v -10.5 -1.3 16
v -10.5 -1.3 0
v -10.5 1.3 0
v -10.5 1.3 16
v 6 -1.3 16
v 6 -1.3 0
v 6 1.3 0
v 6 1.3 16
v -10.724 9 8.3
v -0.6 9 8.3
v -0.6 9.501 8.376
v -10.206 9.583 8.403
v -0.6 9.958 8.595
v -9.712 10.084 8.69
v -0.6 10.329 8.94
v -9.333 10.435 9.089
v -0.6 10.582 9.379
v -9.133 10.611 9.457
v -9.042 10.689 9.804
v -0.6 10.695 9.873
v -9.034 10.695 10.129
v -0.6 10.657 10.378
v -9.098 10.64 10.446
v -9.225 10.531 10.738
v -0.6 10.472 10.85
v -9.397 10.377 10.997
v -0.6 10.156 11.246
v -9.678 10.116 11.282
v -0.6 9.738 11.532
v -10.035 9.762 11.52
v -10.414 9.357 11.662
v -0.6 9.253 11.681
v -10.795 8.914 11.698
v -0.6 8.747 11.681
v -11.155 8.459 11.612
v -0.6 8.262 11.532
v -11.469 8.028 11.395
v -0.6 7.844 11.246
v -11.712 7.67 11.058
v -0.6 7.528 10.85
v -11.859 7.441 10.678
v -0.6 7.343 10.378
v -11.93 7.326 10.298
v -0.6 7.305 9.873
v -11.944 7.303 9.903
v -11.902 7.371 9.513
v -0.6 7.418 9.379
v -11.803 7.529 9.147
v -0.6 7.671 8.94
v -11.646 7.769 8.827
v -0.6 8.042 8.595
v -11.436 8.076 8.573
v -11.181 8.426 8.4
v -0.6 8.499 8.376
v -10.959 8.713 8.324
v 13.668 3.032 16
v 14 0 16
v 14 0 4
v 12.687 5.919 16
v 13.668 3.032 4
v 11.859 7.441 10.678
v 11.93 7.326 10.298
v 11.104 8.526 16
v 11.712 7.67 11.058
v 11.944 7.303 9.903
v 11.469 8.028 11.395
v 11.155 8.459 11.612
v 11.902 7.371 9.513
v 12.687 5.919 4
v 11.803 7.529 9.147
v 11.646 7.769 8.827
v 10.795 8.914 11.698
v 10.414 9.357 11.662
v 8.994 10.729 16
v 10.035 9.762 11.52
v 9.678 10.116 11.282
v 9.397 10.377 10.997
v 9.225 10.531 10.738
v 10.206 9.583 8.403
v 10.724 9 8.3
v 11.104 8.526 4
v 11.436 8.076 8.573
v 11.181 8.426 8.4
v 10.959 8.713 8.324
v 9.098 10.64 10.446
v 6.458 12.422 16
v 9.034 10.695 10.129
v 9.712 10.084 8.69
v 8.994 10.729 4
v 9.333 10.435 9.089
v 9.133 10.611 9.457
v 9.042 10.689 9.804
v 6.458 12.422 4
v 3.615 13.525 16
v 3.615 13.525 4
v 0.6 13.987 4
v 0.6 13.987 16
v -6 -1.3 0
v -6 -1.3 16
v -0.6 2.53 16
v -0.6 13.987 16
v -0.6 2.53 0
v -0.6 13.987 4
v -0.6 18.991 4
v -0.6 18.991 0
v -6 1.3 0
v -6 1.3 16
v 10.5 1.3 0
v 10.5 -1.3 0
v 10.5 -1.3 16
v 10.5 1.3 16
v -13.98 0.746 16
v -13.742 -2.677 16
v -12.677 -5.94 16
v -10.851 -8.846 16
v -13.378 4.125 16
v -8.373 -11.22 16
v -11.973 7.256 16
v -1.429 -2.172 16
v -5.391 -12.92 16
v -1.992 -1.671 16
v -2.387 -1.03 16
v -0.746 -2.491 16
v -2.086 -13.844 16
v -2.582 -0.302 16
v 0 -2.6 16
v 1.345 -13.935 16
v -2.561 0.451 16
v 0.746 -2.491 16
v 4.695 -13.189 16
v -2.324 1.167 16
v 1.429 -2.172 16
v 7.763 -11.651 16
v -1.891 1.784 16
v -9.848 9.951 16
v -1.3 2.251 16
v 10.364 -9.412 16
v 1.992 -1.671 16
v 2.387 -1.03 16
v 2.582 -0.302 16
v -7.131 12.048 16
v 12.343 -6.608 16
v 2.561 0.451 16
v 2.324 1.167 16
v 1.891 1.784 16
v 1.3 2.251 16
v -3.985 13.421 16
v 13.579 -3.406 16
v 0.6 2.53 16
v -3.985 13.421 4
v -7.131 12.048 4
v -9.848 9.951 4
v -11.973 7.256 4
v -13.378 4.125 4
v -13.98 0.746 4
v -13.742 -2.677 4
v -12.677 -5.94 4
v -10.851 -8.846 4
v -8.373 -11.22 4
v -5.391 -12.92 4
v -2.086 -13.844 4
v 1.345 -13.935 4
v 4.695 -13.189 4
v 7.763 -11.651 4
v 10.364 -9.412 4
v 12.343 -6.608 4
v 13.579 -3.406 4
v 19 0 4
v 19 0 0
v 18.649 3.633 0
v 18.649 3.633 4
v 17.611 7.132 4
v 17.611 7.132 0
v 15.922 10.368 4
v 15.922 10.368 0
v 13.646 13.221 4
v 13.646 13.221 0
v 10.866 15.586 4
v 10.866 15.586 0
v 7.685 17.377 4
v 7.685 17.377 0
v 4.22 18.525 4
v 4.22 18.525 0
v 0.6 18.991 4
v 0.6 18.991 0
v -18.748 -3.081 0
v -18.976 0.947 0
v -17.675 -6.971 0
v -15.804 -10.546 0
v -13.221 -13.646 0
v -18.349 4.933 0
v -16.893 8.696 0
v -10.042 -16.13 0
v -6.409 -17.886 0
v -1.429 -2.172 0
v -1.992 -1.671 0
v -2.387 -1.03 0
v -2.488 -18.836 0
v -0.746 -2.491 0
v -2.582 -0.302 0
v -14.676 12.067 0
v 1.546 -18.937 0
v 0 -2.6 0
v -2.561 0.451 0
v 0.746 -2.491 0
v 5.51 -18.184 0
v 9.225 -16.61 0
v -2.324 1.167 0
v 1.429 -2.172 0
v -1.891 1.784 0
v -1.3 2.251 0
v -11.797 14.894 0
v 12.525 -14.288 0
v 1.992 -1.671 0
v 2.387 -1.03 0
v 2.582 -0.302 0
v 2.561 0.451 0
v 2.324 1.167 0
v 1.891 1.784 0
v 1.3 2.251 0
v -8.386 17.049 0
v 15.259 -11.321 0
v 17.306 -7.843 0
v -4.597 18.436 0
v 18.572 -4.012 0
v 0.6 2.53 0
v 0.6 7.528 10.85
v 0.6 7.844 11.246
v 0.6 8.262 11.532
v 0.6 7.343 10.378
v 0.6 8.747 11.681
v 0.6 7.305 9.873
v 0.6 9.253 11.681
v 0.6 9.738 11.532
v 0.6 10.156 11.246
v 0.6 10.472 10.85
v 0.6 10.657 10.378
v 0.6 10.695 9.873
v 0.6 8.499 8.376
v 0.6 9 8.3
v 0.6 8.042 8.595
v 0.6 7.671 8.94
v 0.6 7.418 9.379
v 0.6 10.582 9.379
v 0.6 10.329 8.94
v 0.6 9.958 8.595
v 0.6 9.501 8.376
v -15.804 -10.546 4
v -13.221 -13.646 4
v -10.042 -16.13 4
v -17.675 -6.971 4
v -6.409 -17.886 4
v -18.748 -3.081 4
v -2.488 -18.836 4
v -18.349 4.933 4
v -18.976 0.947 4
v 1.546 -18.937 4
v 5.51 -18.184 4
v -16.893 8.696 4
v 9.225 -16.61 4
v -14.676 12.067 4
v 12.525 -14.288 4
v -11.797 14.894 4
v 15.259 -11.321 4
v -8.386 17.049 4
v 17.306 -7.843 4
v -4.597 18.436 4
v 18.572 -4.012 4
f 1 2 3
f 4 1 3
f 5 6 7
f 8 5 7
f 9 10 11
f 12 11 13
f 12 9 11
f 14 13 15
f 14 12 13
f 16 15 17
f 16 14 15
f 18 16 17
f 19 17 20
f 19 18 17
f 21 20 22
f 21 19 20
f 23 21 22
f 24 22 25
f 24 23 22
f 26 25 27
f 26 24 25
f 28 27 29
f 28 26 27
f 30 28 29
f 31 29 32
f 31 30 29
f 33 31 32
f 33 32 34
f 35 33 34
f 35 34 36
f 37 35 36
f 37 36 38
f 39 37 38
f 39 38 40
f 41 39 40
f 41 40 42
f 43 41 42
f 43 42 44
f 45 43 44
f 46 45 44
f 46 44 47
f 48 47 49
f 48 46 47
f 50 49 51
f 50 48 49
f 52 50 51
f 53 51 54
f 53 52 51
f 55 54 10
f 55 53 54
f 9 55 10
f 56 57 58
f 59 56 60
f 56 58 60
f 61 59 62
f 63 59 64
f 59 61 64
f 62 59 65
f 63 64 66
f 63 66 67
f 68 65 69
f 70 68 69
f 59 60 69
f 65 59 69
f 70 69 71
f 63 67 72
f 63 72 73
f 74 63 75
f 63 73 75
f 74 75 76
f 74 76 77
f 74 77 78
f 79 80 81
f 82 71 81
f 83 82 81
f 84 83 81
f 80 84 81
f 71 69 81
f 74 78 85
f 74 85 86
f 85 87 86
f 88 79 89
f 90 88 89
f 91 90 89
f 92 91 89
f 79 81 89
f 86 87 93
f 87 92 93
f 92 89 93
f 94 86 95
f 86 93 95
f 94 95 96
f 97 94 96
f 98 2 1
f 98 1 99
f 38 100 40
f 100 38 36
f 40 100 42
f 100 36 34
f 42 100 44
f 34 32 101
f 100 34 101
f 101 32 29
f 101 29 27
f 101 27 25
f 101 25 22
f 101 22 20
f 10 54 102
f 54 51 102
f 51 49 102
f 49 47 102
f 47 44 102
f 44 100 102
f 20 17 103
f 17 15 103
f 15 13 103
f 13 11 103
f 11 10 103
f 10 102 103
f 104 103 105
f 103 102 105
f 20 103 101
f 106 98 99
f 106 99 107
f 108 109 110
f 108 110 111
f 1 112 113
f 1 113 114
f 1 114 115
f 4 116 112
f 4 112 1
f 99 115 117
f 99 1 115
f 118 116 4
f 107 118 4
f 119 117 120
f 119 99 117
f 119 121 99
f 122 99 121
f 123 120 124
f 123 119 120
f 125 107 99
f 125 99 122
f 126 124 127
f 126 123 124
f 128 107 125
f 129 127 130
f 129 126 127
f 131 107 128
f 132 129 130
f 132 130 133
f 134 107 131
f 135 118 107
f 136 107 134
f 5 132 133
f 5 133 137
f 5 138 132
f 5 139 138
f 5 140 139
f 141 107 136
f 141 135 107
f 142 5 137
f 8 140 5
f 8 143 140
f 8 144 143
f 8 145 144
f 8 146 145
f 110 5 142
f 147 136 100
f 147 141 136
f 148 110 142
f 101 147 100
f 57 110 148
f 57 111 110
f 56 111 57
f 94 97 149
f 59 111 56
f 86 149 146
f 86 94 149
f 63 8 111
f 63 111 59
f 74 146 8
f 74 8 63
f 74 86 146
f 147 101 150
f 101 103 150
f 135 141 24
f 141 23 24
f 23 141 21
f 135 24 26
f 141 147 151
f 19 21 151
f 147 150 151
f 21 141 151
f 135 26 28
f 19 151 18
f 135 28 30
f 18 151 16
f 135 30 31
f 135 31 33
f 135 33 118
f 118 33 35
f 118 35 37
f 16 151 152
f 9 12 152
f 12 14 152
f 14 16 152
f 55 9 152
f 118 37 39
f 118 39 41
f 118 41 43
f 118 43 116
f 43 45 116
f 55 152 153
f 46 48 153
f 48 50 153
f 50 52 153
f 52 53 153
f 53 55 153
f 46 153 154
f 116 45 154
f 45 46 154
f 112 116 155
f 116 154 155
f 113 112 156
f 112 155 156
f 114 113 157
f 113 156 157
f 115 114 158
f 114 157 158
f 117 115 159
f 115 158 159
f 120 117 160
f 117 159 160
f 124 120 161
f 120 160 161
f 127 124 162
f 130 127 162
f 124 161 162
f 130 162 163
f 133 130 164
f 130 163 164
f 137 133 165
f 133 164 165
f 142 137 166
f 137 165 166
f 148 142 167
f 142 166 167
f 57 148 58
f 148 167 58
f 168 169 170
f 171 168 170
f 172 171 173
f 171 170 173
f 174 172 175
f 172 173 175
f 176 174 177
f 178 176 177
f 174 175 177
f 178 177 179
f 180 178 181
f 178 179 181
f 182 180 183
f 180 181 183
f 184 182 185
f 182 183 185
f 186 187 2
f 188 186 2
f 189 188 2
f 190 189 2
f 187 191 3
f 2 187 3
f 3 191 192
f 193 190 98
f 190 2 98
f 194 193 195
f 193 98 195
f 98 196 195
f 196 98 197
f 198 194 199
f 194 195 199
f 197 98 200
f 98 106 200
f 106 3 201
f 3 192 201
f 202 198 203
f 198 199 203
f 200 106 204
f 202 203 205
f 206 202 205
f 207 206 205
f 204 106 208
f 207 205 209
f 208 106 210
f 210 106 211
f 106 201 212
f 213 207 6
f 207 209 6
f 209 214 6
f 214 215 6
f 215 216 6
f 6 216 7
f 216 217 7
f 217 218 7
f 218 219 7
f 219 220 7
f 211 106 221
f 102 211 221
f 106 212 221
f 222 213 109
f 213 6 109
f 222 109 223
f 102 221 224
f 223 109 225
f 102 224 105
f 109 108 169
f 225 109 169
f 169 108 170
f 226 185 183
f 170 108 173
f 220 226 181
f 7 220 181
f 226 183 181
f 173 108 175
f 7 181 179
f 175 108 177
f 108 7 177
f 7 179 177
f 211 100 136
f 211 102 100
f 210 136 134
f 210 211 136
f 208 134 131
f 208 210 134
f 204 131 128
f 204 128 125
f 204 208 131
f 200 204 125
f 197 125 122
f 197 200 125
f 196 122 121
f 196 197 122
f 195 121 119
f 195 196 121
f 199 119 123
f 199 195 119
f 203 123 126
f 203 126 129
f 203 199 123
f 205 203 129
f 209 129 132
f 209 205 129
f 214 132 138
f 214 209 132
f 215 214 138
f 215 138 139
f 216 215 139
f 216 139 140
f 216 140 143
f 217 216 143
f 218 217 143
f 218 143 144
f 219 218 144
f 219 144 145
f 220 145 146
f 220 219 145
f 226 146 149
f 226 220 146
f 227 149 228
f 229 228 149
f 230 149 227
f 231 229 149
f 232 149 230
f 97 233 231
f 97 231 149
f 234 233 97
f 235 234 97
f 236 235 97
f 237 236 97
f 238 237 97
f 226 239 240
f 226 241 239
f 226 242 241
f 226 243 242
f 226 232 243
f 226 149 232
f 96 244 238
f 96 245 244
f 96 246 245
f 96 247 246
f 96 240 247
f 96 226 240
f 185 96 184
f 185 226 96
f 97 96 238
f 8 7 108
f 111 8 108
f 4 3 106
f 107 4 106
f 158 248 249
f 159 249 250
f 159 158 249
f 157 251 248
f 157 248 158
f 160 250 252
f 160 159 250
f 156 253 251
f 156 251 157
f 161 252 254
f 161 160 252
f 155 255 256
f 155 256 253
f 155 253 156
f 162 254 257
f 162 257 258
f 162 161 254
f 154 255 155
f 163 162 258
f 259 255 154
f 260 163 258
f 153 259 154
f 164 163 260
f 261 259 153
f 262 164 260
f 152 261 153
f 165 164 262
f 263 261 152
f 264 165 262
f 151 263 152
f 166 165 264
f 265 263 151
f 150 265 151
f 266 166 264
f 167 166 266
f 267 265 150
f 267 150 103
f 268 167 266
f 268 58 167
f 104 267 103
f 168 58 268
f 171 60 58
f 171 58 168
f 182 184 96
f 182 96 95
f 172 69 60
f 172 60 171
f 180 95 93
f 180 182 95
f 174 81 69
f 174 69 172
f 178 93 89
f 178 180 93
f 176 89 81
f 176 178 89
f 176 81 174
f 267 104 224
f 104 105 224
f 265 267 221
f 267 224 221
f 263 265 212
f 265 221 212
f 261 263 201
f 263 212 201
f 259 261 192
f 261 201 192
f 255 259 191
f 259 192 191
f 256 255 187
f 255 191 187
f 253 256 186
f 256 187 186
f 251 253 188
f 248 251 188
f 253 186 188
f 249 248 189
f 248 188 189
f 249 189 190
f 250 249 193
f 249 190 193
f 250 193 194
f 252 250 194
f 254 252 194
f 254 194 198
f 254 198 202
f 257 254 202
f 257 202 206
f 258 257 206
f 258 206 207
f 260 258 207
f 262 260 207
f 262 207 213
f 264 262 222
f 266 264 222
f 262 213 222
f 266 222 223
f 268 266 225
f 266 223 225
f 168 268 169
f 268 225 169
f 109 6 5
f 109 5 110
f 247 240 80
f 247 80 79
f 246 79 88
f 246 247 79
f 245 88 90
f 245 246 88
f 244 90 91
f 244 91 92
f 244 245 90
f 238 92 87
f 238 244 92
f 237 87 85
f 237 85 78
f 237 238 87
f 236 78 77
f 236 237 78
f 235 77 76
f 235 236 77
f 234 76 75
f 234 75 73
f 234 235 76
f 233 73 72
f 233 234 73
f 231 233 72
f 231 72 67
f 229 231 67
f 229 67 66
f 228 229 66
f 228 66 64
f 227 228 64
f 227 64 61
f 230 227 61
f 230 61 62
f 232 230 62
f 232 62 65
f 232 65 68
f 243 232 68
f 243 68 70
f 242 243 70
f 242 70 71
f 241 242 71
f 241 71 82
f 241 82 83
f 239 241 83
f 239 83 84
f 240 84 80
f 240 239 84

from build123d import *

# Parameters (mm, degrees)
SKETCH_1_R                                       = 19
HORN_FLANGE_D38_DEPTH                            = 4
SKETCH_2_R                                       = 14
SHAFT_CLAMP_HUB_DEPTH                            = 16
SHAFT_D5P2_DEPTH                                 = 32.272991542
SHAFT_D5P2_DEPTH_BACK                            = 32.272991542
SKETCH_3_R                                       = 2.6
CLAMP_SPLIT_DEPTH                                = 32.272991542
CLAMP_SPLIT_DEPTH_BACK                           = 32.272991542
SKETCH_4_W                                       = 1.2
SKETCH_4_H                                       = 17.8
HORN_TWO_ADJUSTMENT_SLOTS_VERIFY_HORN_DEPTH      = 32.272991542
HORN_TWO_ADJUSTMENT_SLOTS_VERIFY_HORN_DEPTH_BACK = 32.272991542
SKETCH_5_W                                       = 4.5
SKETCH_5_H                                       = 2.6
COUPLER_CLAMP_M3_DEPTH                           = 32.272991542
COUPLER_CLAMP_M3_DEPTH_BACK                      = 32.272991542
SKETCH_6_R                                       = 1.7


with BuildPart() as part:
    # 草图1 → Horn_flange_D38 (new body)
    with BuildSketch(Plane.XY):
        Circle(SKETCH_1_R)
    extrude(amount=HORN_FLANGE_D38_DEPTH)

    # 草图2 → Shaft_clamp_hub (add)
    with BuildSketch(Plane.XY):
        Circle(SKETCH_2_R)
    extrude(amount=SHAFT_CLAMP_HUB_DEPTH)

    # 草图3 → Shaft_D5p2 (cut, two sides: drawn at the far end of the back side and taken through both)
    with BuildSketch(Plane.XY.offset(-SHAFT_D5P2_DEPTH_BACK)):
        Circle(SKETCH_3_R)
    extrude(amount=SHAFT_D5P2_DEPTH + SHAFT_D5P2_DEPTH_BACK, mode=Mode.SUBTRACT)

    # 草图4 → Clamp_split (cut, two sides: drawn at the far end of the back side and taken through both)
    with BuildSketch(Plane.XY.offset(-CLAMP_SPLIT_DEPTH_BACK)):
        with Locations((0, 11.1)):
            Rectangle(SKETCH_4_W, SKETCH_4_H)
    extrude(amount=CLAMP_SPLIT_DEPTH + CLAMP_SPLIT_DEPTH_BACK, mode=Mode.SUBTRACT)

    # 草图5 → Horn_two_adjustment_slots_VERIFY_HORN (cut, two sides: drawn at the far end of the back side and taken through both)
    with BuildSketch(Plane.XY.offset(-HORN_TWO_ADJUSTMENT_SLOTS_VERIFY_HORN_DEPTH_BACK)):
        with Locations((-8.25, 0)):
            Rectangle(SKETCH_5_W, SKETCH_5_H)
        with Locations((8.25, 0)):
            Rectangle(SKETCH_5_W, SKETCH_5_H)
    extrude(amount=HORN_TWO_ADJUSTMENT_SLOTS_VERIFY_HORN_DEPTH + HORN_TWO_ADJUSTMENT_SLOTS_VERIFY_HORN_DEPTH_BACK, mode=Mode.SUBTRACT)

    # 草图6 → Coupler_clamp_M3 (cut, two sides: drawn at the far end of the back side and taken through both)
    with BuildSketch(Plane(origin=(0, 0, 0), x_dir=(0, 0, -1), z_dir=(1, 0, 0)).offset(-COUPLER_CLAMP_M3_DEPTH_BACK)):
        with Locations((-10, 9)):
            Circle(SKETCH_6_R)
    extrude(amount=COUPLER_CLAMP_M3_DEPTH + COUPLER_CLAMP_M3_DEPTH_BACK, mode=Mode.SUBTRACT)


solid = part.part
